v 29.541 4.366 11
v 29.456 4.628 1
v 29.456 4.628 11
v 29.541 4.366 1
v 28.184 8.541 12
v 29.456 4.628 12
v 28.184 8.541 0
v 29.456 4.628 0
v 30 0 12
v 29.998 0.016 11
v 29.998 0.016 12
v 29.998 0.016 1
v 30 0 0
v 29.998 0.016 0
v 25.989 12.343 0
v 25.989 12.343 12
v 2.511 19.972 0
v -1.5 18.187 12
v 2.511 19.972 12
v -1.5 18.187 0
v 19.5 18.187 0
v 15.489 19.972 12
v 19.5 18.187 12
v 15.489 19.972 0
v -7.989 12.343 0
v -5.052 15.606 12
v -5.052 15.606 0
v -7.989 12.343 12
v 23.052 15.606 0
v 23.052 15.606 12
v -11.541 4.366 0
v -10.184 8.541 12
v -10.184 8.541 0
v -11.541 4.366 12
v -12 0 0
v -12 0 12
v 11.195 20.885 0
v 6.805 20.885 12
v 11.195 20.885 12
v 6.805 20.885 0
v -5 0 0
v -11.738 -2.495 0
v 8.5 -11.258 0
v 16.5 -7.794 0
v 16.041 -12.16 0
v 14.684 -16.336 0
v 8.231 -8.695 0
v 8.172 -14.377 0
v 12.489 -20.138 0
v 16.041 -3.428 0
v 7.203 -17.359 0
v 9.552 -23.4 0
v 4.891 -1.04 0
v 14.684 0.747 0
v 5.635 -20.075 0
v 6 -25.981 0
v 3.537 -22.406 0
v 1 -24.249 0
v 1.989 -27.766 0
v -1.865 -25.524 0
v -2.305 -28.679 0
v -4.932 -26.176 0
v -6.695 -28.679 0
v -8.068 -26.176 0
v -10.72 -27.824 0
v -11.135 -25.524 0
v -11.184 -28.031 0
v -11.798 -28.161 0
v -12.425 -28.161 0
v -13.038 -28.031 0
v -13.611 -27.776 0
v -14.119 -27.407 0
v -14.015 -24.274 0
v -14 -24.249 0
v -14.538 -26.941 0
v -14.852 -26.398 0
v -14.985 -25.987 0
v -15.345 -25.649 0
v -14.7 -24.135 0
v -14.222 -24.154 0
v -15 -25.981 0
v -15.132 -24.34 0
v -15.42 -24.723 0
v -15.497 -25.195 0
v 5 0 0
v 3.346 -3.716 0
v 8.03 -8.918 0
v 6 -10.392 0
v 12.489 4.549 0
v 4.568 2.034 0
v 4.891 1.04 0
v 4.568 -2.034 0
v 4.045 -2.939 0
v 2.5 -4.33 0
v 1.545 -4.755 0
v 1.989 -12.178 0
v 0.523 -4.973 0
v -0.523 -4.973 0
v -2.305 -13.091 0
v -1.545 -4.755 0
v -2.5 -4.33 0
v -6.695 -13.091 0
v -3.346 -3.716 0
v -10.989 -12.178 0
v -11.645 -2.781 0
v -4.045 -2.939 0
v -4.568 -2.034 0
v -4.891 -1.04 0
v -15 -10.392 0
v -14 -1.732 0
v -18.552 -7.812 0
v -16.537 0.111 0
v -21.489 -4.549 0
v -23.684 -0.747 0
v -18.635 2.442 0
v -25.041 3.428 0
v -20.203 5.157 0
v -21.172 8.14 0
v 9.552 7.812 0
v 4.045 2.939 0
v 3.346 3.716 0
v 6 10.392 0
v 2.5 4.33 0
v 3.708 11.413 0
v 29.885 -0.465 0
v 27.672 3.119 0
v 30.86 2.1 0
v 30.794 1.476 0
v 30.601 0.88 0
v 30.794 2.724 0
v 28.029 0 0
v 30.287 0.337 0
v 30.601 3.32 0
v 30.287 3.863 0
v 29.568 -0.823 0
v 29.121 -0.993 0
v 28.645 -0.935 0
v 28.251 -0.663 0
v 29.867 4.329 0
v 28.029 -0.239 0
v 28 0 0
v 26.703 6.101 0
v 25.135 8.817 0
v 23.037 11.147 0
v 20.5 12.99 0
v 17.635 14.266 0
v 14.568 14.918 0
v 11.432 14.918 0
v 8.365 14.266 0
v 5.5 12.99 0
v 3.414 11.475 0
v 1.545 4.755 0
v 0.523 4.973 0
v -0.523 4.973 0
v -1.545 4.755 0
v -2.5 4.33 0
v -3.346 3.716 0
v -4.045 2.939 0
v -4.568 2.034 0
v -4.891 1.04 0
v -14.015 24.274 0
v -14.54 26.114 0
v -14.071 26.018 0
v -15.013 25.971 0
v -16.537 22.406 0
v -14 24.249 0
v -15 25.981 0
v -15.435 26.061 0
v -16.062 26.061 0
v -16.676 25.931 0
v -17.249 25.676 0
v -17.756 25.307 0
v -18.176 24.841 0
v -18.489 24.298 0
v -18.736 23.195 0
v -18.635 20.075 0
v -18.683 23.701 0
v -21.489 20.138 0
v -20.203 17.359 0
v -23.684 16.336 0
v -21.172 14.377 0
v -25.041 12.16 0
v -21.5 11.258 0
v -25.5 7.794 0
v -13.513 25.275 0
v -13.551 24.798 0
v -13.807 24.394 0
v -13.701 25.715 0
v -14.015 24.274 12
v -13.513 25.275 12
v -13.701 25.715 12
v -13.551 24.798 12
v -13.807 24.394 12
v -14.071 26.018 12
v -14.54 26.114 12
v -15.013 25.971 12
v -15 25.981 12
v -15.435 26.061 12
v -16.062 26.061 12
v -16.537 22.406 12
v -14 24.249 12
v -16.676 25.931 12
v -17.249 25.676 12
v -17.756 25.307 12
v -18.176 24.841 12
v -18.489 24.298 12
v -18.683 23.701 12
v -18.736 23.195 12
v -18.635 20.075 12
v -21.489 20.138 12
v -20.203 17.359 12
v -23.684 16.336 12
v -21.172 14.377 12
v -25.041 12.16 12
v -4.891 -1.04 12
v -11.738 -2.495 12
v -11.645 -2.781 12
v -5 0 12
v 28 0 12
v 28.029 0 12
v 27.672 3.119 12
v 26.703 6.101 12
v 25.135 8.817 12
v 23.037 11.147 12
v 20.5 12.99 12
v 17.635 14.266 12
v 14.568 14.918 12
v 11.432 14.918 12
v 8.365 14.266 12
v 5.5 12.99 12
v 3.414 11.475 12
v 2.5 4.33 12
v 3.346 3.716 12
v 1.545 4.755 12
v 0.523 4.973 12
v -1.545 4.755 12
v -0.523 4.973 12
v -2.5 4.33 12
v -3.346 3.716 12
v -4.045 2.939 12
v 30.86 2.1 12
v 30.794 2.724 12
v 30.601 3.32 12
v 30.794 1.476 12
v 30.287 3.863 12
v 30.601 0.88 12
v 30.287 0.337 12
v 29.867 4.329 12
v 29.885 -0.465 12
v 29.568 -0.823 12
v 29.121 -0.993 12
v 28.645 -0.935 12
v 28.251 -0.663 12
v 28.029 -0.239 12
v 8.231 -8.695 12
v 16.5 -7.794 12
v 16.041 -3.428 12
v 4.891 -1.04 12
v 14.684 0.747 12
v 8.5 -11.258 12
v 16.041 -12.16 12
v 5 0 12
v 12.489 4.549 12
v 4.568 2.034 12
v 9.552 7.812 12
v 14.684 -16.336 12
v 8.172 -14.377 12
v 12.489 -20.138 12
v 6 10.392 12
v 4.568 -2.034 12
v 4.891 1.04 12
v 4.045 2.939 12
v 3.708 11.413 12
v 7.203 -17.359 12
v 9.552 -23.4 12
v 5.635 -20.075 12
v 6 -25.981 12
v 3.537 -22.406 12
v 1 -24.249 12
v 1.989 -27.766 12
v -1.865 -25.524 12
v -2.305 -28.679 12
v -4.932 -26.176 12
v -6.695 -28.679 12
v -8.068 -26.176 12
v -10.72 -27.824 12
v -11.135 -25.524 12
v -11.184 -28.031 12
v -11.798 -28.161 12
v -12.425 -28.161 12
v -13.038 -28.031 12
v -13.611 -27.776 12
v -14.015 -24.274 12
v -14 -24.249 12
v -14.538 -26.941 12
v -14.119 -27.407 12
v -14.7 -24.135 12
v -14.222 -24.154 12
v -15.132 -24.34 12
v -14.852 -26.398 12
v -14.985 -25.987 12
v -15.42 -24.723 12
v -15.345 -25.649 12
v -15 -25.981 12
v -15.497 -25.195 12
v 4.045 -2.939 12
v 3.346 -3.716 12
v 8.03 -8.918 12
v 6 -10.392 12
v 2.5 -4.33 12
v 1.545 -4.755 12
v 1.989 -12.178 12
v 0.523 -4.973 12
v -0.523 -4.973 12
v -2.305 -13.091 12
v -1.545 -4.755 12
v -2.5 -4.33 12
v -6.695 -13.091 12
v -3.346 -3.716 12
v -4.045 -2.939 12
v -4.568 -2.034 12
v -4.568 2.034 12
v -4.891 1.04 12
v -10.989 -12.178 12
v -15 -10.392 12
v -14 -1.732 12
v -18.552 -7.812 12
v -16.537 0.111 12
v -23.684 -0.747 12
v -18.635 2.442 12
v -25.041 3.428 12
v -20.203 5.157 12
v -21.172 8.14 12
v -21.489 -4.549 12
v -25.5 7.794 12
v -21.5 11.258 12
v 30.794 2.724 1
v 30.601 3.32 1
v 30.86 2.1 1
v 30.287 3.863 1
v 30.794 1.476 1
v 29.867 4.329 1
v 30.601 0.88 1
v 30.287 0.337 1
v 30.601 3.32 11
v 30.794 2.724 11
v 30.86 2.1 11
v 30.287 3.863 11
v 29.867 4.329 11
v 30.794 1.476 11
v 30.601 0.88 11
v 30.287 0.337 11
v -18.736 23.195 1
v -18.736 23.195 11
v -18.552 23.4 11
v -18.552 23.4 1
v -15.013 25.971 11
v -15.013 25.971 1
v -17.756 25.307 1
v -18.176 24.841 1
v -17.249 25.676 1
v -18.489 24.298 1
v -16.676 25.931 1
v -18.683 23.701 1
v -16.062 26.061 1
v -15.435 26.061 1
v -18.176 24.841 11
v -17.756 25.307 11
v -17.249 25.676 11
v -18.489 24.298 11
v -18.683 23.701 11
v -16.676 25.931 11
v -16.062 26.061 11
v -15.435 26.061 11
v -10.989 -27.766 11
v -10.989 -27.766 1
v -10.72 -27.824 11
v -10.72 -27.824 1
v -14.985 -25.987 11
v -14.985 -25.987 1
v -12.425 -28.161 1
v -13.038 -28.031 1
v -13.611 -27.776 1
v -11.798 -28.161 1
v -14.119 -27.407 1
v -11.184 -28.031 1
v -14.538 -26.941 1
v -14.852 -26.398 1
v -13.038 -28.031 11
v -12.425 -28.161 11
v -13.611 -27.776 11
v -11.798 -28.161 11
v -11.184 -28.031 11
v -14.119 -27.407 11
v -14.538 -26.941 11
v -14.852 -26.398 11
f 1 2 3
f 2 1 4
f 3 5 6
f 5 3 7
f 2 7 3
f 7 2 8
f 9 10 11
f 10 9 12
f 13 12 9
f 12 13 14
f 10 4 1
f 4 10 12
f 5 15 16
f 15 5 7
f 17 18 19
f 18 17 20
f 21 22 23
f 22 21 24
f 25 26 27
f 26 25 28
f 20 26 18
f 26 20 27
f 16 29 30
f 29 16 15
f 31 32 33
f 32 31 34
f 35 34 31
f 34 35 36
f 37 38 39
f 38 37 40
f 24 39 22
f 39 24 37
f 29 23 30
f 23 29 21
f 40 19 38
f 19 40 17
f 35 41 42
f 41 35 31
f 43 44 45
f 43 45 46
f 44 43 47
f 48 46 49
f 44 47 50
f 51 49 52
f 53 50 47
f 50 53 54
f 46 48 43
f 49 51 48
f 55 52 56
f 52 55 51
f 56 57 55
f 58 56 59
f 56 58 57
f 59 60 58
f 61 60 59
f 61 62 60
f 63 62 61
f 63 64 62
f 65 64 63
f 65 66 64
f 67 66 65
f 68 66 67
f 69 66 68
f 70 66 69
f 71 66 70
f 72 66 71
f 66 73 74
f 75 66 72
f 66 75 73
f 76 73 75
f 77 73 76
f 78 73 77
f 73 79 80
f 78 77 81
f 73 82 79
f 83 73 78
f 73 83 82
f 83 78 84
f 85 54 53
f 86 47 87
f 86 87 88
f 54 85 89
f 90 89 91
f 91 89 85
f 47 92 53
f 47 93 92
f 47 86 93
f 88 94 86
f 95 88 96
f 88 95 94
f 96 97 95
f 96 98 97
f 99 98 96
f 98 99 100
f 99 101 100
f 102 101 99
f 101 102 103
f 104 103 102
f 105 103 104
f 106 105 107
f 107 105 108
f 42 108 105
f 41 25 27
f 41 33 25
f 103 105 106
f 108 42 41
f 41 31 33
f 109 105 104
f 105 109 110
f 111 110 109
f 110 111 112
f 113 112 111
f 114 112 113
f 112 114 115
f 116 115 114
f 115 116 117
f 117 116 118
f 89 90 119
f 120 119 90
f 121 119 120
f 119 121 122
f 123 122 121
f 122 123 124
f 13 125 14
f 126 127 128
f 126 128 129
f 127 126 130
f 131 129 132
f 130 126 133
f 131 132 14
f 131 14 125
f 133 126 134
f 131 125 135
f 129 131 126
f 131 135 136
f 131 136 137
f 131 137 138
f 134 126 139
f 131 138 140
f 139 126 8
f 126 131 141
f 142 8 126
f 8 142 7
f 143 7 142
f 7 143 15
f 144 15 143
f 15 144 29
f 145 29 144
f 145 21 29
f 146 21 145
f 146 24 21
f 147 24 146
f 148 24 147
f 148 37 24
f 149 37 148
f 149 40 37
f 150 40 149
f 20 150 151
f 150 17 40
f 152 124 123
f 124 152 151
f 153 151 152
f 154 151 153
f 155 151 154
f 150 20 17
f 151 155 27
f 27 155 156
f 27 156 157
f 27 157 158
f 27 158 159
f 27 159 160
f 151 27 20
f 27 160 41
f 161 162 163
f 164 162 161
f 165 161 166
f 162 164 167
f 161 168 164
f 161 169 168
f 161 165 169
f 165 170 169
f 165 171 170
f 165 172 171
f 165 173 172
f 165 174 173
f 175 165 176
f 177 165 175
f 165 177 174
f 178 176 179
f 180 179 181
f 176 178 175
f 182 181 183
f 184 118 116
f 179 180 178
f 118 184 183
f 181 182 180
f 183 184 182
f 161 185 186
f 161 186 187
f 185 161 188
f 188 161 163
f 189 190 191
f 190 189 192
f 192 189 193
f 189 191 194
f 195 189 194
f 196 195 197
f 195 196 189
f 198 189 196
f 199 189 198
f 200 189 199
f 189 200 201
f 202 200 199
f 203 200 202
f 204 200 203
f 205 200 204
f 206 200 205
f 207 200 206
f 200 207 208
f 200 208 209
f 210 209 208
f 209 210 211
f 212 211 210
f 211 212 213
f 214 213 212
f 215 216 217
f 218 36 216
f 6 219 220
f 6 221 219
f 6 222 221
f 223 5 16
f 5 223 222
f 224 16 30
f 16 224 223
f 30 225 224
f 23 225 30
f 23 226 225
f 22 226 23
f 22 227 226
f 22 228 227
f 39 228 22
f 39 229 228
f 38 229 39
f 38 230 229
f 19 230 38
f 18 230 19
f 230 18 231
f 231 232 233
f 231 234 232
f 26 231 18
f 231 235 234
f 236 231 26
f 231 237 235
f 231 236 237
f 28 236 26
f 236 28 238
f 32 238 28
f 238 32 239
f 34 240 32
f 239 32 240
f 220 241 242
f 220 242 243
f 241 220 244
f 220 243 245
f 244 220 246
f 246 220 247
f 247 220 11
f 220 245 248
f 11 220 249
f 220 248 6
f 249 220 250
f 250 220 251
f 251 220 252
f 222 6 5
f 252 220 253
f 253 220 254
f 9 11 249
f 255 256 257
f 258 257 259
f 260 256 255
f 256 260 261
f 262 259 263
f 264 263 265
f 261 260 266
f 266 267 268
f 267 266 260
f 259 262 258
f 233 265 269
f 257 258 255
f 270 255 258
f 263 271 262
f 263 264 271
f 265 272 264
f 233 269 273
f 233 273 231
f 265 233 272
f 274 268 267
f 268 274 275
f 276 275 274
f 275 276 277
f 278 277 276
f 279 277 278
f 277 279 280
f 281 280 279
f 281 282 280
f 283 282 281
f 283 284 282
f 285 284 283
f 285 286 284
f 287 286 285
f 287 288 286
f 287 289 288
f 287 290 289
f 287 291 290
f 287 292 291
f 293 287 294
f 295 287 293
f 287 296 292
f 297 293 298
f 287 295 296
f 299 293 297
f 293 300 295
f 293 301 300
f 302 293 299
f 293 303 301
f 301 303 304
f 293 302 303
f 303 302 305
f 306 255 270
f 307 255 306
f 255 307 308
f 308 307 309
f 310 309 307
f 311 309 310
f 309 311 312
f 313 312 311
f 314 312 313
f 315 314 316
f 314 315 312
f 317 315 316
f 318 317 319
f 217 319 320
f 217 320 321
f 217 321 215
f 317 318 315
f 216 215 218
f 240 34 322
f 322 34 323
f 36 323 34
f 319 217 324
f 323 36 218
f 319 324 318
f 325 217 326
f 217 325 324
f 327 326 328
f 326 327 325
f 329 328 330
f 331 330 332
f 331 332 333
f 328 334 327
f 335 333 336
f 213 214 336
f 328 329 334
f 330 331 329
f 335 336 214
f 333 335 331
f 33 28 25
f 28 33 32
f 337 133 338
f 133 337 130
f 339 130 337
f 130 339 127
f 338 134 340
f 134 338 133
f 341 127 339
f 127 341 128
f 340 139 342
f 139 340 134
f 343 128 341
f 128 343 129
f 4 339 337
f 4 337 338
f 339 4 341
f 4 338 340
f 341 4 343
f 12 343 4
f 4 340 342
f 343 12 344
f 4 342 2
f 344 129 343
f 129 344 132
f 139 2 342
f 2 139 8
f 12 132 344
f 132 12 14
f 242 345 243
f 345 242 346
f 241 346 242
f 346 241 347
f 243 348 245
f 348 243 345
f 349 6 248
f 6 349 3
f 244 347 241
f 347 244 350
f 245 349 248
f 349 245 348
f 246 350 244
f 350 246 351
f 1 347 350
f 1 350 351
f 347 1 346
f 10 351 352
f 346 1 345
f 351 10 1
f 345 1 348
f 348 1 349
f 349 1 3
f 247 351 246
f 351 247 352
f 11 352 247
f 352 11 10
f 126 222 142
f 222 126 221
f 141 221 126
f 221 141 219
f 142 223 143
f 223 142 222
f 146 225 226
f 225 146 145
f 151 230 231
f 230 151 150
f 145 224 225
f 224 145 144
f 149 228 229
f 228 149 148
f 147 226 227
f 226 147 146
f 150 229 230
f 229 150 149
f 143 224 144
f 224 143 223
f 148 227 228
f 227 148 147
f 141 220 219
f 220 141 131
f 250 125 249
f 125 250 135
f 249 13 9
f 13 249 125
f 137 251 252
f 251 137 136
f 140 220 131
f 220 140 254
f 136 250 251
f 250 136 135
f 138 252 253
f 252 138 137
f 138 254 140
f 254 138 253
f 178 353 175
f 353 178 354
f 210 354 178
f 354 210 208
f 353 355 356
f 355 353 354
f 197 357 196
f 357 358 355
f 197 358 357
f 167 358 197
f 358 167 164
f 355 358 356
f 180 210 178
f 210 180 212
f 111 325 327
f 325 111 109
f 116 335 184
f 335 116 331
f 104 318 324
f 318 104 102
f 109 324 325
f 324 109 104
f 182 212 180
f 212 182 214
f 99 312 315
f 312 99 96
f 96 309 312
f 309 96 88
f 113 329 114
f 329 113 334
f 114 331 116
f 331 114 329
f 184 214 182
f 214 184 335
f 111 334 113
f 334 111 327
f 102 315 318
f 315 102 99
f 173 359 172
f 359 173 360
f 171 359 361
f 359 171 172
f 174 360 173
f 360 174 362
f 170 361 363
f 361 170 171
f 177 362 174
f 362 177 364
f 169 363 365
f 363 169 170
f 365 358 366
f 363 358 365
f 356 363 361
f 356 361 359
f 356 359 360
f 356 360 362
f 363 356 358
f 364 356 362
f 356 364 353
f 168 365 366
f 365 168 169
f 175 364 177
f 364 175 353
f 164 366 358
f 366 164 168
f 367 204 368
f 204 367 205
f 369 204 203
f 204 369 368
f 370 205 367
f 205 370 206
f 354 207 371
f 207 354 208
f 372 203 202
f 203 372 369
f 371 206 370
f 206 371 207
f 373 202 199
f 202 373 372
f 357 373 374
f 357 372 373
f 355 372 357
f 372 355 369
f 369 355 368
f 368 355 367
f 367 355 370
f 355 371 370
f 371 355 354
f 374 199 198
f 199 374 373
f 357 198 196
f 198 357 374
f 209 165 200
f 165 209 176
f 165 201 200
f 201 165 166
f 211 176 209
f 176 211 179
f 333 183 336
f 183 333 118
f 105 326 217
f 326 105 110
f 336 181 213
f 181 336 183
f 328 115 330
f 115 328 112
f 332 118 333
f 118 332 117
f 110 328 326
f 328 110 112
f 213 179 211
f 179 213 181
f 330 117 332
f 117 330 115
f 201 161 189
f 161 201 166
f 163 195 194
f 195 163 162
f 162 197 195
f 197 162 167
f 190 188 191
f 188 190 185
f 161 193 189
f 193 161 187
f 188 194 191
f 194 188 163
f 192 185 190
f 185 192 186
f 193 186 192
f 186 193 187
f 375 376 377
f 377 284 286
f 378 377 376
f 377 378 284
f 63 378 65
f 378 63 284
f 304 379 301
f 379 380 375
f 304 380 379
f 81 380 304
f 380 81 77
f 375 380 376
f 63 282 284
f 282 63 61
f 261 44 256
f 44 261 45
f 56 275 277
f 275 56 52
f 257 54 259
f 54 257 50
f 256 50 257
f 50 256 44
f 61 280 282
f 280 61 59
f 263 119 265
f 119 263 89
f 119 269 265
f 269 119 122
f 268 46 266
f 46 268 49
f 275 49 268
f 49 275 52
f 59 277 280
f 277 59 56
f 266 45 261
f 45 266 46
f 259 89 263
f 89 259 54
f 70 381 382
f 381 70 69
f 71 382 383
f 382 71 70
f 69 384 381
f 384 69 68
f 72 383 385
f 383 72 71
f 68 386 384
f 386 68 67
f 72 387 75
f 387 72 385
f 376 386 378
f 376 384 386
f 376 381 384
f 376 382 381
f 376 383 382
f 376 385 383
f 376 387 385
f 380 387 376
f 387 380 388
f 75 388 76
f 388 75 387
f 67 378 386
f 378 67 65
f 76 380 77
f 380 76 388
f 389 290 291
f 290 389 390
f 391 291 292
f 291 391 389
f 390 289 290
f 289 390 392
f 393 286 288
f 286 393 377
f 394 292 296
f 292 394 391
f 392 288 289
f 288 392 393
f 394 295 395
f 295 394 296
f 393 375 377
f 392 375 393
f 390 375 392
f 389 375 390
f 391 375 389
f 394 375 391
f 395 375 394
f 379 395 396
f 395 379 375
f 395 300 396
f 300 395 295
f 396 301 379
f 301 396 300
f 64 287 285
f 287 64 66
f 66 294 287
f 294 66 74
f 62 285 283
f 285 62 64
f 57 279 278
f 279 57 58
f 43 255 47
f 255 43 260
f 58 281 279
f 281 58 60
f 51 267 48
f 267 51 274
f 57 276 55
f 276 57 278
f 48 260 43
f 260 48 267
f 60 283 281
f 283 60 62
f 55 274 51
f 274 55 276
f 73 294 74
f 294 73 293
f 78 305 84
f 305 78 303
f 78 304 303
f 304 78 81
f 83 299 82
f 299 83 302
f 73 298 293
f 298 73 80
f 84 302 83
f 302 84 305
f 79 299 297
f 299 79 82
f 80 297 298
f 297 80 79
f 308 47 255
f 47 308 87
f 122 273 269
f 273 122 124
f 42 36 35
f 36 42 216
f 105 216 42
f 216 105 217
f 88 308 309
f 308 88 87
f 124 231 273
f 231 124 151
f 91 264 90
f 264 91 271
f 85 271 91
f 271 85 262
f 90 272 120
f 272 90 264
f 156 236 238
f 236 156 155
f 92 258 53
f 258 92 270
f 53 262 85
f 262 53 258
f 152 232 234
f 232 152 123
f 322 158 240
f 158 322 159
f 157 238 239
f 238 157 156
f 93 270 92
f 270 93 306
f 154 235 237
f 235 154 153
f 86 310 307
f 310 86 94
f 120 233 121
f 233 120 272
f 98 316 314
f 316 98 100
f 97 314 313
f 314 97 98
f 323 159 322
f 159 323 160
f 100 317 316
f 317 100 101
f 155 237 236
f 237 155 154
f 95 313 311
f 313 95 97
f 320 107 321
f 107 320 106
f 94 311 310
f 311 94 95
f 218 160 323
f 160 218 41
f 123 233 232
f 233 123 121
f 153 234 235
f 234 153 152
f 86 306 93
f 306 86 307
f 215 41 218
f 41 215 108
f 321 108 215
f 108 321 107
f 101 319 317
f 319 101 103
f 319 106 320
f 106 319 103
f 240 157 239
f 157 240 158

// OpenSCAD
// This should be 2mm larger that the hole in your spool. Eg. 60mm for a 58mm spool hole.
Hub_Diameter = 60;

// Hole in the hub for the spool rod. Should be slighly larger than the rod diameter.
Hole_Diameter = 10;

// Core of the hub. The default should usually be good, but you may need to adjust for very large hole or small hub.
Core_Diameter = 24;

// Thickness of the hub. It should at least 2mm thicker than the wall of your spool to cater for the catch on the hub.
Thickness = 12;

// You need at least 3 to be stable, but feel free to go crazy with this one.
Number_of_Arms = 3;

/* [Hidden] */
Catch_Thickness = 1;
Core_Radius = Core_Diameter / 2;
Catch_Radius = Hub_Diameter / 60 * 3;
Catch_X = Hub_Diameter / 60 * 27.86;
Catch_Y = Hub_Diameter / 60 * 2.1;
Hub_Radius = Hub_Diameter / 2;
Arm_Radius = (Hub_Radius + Core_Radius)/2;
Arm_Inner_Radius = Hub_Diameter / 4;
Tip_Width = Hub_Diameter / 30;

$fs = 0.5;

module Arm(){
    difference(){
        union(){
            translate([Hub_Radius-Arm_Radius,0,0]) cylinder(r=Arm_Radius,h=Thickness);
            translate([Catch_X,Catch_Y,0]) cylinder(r=Catch_Radius,h=Catch_Thickness);
            translate([Catch_X,Catch_Y,Thickness-Catch_Thickness]) cylinder(r=Catch_Radius,h=Catch_Thickness);
        }
        translate([Hub_Radius-Arm_Inner_Radius-Tip_Width,0,-1]) cylinder(r=Arm_Inner_Radius,h=Thickness+2);
        translate([0,-Hub_Radius,0]) cube([Hub_Diameter,Hub_Diameter,Thickness*2+2],center=true);
    }
    translate([Hub_Radius-Tip_Width/2,0,0]) cylinder(d=Tip_Width,h=Thickness);
}

difference() {
    union() {
        cylinder(r=Core_Radius,h=Thickness);
        for (a =[0 : 360/Number_of_Arms : 360])
            rotate([0,0,a]) Arm();
    }
    translate([0,0,-1]) cylinder(d=Hole_Diameter,h=Thickness+2);
}
